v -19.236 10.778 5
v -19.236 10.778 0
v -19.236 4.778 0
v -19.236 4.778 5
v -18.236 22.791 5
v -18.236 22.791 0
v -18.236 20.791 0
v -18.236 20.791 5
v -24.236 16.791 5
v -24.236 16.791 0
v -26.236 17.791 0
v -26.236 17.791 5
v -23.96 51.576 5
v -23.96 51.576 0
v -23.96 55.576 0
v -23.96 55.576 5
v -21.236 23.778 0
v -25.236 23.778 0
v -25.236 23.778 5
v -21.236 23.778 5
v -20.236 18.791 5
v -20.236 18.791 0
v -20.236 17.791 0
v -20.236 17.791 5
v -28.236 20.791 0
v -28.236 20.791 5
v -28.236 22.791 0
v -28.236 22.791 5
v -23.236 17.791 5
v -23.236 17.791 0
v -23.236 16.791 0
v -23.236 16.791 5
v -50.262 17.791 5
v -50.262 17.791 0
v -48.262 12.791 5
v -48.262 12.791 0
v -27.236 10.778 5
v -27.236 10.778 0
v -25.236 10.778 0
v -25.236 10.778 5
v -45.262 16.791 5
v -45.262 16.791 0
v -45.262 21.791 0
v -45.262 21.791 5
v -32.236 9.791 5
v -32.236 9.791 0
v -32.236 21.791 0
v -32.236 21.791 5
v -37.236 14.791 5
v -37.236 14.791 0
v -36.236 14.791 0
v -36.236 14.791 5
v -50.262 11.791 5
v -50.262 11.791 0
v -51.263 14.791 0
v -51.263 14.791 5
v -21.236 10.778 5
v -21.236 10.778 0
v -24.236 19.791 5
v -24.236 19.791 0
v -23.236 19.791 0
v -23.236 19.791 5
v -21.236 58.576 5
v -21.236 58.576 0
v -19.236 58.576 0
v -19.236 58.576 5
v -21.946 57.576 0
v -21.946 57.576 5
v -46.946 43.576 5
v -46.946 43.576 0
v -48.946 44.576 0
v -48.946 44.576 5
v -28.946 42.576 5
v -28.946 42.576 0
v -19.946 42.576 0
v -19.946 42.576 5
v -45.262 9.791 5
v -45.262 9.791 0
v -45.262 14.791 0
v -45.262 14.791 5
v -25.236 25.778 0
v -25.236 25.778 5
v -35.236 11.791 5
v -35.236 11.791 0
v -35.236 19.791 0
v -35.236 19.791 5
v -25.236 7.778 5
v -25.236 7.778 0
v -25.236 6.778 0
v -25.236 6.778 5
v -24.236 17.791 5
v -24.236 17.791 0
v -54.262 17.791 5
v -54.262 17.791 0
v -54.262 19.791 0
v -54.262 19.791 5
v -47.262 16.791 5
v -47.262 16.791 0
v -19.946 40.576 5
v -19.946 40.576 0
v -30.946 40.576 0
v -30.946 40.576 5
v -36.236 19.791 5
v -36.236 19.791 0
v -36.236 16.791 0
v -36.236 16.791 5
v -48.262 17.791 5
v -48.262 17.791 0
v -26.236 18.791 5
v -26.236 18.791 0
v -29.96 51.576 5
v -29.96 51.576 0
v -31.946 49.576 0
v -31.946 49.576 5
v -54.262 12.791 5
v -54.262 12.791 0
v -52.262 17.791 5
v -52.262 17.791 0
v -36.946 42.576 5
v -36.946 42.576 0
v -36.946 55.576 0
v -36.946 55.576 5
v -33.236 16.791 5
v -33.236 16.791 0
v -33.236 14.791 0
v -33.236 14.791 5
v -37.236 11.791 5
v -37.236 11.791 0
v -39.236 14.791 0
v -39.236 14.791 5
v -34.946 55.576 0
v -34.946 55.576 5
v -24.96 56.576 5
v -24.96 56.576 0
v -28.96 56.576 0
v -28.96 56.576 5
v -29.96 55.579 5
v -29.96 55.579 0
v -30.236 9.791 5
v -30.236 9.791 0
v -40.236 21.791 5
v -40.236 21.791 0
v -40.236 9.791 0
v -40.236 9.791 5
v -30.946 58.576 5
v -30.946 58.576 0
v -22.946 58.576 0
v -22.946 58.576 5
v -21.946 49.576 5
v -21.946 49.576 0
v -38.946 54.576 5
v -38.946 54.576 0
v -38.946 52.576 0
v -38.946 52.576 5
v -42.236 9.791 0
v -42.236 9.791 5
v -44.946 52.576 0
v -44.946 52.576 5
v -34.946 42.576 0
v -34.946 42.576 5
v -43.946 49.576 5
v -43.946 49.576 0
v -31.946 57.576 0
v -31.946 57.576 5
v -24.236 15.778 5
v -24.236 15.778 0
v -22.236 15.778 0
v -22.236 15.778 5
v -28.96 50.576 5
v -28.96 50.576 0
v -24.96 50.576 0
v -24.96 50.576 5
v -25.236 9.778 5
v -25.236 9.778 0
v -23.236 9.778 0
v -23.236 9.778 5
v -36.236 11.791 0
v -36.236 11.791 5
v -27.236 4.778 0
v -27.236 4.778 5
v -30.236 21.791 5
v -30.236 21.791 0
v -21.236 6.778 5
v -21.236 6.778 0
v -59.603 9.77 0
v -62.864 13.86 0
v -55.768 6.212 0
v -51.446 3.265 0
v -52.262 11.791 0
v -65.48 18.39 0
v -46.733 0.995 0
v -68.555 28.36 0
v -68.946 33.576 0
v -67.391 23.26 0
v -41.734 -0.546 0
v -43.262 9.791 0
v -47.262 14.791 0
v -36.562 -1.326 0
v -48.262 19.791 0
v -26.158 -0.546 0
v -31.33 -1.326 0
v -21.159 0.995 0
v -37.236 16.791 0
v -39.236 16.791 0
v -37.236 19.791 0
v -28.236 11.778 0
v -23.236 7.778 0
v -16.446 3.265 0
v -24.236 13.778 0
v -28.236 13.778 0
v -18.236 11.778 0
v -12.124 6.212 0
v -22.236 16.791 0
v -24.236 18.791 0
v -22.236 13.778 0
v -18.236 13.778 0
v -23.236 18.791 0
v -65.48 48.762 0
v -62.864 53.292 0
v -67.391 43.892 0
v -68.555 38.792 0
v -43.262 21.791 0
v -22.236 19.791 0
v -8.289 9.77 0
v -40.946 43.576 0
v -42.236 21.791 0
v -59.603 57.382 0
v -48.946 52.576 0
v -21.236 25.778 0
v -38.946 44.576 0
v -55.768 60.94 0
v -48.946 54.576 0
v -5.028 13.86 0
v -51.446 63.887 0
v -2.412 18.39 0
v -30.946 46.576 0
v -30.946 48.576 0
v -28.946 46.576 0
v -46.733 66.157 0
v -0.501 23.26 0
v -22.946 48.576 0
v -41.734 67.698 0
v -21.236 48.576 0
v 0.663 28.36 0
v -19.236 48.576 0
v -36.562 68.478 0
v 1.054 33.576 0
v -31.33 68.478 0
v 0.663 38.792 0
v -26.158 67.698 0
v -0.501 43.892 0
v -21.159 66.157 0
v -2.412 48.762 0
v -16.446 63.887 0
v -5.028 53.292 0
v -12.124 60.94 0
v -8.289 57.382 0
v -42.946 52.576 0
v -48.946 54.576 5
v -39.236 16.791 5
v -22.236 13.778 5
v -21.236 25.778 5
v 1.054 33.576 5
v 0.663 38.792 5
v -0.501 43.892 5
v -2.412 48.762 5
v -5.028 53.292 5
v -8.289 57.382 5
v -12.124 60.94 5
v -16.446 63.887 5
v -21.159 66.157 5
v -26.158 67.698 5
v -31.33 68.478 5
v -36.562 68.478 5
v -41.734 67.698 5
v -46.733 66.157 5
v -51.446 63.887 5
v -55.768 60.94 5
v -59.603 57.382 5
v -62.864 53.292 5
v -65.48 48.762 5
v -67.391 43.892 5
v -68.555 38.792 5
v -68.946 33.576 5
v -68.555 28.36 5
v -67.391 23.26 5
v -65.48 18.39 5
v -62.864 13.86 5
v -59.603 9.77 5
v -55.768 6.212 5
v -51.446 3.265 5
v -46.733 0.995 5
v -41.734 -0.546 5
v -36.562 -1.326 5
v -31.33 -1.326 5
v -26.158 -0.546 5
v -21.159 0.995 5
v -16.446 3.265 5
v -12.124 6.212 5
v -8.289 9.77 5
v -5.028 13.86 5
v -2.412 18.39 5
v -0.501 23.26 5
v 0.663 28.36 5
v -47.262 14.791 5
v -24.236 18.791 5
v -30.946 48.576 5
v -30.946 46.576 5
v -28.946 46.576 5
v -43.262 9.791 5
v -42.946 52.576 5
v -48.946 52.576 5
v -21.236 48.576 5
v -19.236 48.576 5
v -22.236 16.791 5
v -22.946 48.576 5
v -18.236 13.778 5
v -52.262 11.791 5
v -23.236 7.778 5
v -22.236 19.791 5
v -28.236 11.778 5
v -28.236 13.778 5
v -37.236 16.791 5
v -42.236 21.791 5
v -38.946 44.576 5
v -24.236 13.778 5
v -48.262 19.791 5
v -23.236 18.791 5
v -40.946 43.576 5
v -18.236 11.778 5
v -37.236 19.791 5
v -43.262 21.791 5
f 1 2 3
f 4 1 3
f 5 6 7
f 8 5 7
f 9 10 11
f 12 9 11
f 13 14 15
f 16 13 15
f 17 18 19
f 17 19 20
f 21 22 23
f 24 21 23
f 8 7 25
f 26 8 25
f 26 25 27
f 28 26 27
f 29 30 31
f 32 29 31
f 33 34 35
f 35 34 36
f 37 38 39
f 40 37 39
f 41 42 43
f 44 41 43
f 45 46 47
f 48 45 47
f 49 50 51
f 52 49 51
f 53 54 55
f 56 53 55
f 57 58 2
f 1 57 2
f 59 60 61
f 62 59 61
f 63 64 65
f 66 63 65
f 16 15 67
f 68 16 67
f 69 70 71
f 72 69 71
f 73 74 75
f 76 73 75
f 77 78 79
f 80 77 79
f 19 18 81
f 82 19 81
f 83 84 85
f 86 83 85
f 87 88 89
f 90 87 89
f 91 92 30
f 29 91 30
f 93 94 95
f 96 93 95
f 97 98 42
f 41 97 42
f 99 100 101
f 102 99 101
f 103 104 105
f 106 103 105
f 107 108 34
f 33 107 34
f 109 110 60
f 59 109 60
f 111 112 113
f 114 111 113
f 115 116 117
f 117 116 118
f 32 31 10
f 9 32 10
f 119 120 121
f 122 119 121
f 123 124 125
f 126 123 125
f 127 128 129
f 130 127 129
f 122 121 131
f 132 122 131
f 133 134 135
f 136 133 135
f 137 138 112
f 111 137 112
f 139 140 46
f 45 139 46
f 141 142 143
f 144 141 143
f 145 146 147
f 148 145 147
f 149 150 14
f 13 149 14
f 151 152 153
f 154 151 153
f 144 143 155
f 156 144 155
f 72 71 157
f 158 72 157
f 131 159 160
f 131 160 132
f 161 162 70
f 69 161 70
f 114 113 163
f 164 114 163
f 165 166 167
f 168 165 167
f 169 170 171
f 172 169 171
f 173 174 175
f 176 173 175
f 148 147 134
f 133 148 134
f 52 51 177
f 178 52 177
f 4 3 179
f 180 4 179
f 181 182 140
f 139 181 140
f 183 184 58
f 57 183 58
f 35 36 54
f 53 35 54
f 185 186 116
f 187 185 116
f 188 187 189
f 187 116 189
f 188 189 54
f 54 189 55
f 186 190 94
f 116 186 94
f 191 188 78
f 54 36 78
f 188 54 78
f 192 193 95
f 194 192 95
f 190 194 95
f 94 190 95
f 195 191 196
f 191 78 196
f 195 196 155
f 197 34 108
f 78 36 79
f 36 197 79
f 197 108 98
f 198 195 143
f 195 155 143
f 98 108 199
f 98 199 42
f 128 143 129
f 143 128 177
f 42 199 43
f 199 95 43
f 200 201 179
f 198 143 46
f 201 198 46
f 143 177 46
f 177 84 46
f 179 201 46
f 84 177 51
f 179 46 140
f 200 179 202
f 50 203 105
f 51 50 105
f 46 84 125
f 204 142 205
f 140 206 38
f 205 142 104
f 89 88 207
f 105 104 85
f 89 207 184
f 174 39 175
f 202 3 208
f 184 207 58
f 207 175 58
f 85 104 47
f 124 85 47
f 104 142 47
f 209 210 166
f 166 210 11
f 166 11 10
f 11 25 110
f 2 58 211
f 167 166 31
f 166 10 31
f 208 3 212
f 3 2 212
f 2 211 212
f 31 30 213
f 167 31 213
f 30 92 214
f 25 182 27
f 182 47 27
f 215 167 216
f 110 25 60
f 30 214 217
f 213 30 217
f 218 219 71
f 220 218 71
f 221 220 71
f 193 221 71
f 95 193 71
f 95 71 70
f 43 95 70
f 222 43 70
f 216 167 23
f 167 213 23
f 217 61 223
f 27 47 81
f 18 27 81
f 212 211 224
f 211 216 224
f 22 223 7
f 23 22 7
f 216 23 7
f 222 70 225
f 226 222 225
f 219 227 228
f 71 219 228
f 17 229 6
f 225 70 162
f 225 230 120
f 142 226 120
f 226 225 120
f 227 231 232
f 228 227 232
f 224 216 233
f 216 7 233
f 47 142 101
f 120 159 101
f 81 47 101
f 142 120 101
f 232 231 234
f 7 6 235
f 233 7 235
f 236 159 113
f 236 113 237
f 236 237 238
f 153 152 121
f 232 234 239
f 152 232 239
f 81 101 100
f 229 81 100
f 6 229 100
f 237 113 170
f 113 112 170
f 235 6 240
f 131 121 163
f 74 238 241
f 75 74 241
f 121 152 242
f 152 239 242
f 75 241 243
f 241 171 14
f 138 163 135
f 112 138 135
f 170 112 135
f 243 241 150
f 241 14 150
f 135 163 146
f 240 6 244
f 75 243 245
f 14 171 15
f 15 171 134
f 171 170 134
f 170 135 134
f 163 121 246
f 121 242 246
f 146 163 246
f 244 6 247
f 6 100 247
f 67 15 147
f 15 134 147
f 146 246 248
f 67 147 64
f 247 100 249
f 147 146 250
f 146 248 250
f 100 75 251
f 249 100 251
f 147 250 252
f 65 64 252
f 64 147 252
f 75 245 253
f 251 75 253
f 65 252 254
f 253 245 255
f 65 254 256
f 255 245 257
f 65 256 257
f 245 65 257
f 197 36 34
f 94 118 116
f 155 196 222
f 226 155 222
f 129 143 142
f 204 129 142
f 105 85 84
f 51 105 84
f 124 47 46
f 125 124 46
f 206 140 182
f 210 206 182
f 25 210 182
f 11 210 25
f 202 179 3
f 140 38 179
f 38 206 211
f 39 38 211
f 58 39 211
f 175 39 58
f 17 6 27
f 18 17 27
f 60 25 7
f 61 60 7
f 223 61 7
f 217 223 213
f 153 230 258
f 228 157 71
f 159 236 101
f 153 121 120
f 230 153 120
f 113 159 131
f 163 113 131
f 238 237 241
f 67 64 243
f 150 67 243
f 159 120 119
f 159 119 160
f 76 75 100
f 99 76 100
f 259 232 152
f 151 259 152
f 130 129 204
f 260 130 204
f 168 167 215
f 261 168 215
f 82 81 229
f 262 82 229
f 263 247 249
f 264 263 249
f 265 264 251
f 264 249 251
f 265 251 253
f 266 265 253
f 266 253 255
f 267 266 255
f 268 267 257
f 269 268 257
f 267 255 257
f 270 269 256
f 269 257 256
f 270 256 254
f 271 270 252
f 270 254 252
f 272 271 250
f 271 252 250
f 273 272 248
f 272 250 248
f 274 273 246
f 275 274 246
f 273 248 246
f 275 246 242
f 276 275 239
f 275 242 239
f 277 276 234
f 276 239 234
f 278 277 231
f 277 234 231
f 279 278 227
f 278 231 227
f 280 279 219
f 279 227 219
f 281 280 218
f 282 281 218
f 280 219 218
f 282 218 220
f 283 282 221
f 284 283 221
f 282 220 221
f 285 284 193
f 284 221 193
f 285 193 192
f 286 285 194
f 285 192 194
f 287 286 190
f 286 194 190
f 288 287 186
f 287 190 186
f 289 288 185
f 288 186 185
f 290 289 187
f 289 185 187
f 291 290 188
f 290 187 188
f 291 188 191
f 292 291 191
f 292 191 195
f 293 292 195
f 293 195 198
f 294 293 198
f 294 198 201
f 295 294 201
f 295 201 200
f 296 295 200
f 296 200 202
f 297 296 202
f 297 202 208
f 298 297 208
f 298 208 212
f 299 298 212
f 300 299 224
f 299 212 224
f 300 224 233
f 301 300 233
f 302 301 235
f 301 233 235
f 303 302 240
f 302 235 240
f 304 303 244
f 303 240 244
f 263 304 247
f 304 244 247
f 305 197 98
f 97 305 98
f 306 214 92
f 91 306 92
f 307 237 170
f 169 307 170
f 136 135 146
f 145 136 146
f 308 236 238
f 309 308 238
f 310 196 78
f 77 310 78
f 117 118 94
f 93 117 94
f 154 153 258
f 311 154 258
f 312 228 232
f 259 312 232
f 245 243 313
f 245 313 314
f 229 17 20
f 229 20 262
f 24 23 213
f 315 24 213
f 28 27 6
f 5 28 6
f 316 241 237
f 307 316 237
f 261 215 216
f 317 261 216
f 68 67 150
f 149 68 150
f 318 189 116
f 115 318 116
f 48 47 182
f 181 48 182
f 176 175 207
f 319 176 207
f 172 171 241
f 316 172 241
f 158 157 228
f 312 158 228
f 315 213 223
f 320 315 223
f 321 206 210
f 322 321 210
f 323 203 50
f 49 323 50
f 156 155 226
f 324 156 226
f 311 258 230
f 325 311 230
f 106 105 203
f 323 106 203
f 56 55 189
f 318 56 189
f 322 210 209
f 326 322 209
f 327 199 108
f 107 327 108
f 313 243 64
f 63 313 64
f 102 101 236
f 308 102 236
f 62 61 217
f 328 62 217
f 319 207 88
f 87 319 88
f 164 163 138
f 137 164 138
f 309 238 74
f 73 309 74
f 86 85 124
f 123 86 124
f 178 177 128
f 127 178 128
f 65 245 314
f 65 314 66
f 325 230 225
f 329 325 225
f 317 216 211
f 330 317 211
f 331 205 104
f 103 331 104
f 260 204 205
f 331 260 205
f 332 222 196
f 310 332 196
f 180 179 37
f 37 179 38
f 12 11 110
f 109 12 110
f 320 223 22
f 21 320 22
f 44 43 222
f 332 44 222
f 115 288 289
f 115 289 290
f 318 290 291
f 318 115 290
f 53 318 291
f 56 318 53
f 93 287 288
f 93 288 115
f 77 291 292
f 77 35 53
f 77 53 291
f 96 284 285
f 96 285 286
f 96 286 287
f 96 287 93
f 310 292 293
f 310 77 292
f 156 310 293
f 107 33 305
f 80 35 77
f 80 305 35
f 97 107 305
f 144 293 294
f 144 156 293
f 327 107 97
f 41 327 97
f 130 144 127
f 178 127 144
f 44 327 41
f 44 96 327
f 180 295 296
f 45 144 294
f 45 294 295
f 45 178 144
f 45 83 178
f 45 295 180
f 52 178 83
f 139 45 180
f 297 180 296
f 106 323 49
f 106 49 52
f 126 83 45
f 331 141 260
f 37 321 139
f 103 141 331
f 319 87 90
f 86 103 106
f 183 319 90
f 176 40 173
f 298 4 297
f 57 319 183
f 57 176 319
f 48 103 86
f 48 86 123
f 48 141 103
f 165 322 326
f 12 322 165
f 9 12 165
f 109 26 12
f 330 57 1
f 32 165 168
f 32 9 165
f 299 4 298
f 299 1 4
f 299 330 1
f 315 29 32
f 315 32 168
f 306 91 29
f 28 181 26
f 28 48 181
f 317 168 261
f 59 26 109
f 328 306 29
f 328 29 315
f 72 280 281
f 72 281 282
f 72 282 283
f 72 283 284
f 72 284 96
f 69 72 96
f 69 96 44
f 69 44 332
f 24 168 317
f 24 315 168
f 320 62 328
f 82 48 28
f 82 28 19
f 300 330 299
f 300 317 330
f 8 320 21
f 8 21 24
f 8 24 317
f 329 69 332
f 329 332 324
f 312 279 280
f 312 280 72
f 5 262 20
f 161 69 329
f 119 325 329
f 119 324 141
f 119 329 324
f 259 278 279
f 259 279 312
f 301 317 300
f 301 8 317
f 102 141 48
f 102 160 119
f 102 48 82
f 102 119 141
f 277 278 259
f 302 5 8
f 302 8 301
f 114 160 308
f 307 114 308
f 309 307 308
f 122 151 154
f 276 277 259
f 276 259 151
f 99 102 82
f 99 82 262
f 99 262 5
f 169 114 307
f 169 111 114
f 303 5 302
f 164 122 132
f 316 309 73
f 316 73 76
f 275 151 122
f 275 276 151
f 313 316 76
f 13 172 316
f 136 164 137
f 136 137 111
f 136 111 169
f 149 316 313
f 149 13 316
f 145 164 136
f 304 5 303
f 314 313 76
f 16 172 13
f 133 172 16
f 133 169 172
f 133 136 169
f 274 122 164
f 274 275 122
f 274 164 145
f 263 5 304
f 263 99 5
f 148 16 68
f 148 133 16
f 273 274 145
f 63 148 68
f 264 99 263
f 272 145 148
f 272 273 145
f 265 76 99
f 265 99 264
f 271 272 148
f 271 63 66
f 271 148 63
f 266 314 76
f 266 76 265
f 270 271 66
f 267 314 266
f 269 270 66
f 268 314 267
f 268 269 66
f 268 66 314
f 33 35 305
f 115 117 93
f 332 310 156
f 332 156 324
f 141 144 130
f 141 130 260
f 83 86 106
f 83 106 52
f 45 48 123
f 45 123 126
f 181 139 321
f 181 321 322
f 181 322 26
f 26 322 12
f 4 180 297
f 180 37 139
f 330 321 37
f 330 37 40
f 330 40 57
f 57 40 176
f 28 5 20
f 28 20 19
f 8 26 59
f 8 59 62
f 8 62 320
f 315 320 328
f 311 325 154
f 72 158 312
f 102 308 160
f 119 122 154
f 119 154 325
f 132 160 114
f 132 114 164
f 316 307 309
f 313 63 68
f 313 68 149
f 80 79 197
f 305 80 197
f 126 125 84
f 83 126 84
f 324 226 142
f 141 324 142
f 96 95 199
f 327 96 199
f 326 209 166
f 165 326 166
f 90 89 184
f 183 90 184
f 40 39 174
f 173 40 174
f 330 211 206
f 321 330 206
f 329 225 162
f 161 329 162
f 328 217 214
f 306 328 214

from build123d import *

# Parameters (mm, degrees)
F0_R     = 35
F0_W     = 4
F0_H     = 2
F0_W_2   = 2
F0_H_2   = 13
F0_H_3   = 10
F1_DEPTH = 5


with BuildPart() as f1:
    # F0 (on Top) → F1 (new body)
    with BuildSketch(Plane.XY):
        with Locations((-33.946003, 33.575995)):
            Circle(F0_R)
        Polygon((-54.261632, 19.790954), (-48.261632, 19.790954), (-48.261632, 17.790954), (-50.261632, 17.790954), (-48.261632, 12.791132), (-50.261632, 11.791284), (-51.262511, 14.790954), (-52.261632, 11.790954), (-54.261632, 12.791132), (-52.261632, 17.790954), (-54.261632, 17.790954), align=None, mode=Mode.SUBTRACT)
        Polygon((-45.261632, 21.791132), (-43.261632, 21.791132), (-43.261632, 9.791132), (-45.261632, 9.791132), (-45.261632, 14.791132), (-47.261632, 14.791132), (-47.261632, 16.791132), (-45.261632, 16.791132), align=None, mode=Mode.SUBTRACT)
        Polygon((-41.261632, 21.791132), (-40.235692, 21.791132), (-40.235692, 9.791132), (-42.235692, 9.791132), (-42.235692, 21.791132), align=None, mode=Mode.SUBTRACT)
        Polygon((-39.235692, 14.791132), (-39.235692, 16.791132), (-37.235692, 19.791132), (-36.235692, 19.791132), (-36.235692, 16.791132), (-37.235692, 16.791132), (-37.235692, 14.791132), (-36.235692, 14.791132), (-36.235692, 11.791132), (-37.235692, 11.791132), align=None, mode=Mode.SUBTRACT)
        Polygon((-35.235692, 11.791132), (-35.235692, 19.791132), (-33.235692, 16.791132), (-33.235692, 14.791132), align=None, mode=Mode.SUBTRACT)
        Polygon((-32.235692, 21.791132), (-30.235692, 21.791132), (-30.235692, 9.791132), (-32.235692, 9.791132), (-32.235692, 11.791132), (-32.235692, 19.791132), align=None, mode=Mode.SUBTRACT)
        Polygon((-27.235692, 4.777636), (-27.235692, 10.777636), (-26.235692, 10.777636), (-25.235692, 10.777636), (-25.235692, 9.777636), (-23.235692, 9.777636), (-23.235692, 7.777636), (-25.235692, 7.777636), (-25.235692, 6.777636), (-21.235692, 6.777636), (-21.235692, 10.777636), (-20.235692, 10.777636), (-19.235692, 10.777636), (-19.235692, 4.777636), align=None, mode=Mode.SUBTRACT)
        Polygon((-18.235692, 11.777636), (-28.235692, 11.777636), (-28.235692, 13.777636), (-24.235692, 13.777636), (-24.235692, 15.777636), (-22.235692, 15.777636), (-22.235692, 13.777636), (-18.235692, 13.777636), align=None, mode=Mode.SUBTRACT)
        Polygon((-23.235692, 16.791132), (-24.235692, 16.791132), (-26.235692, 17.79098), (-26.235692, 18.791284), (-24.235692, 19.791132), (-23.235692, 19.791132), (-23.235692, 18.791132), (-24.235692, 18.791132), (-24.235692, 17.79098), (-23.235692, 17.79098), align=None, mode=Mode.SUBTRACT)
        Polygon((-22.235692, 19.791132), (-20.235692, 18.79098), (-20.235692, 17.79098), (-22.235692, 16.791132), align=None, mode=Mode.SUBTRACT)
        Polygon((-28.235692, 22.791132), (-18.235692, 22.791132), (-18.235692, 20.791132), (-28.235692, 20.791132), (-28.235692, 21.791132), align=None, mode=Mode.SUBTRACT)
        with Locations((-23.235692, 24.777636)):
            Rectangle(F0_W, F0_H, mode=Mode.SUBTRACT)
        Polygon((-48.946003, 52.576141), (-48.946003, 54.576141), (-38.946003, 54.576141), (-38.946003, 52.576141), (-42.945711, 52.576141), (-38.946003, 44.575995), (-40.946039, 43.576068), (-43.946094, 49.575812), (-46.946003, 43.575995), (-48.945828, 44.575907), (-44.945711, 52.576141), align=None, mode=Mode.SUBTRACT)
        with Locations((-35.946003, 49.075995)):
            Rectangle(F0_W_2, F0_H_2, mode=Mode.SUBTRACT)
        Polygon((-30.946003, 40.575995), (-30.946003, 46.575995), (-28.946003, 46.575995), (-28.946003, 42.575995), (-19.946003, 42.575995), (-19.946003, 40.575995), (-28.946003, 40.575995), align=None, mode=Mode.SUBTRACT)
        Polygon((-22.946003, 48.575995), (-30.946003, 48.575995), (-28.959546, 50.575995), (-24.959546, 50.575995), align=None, mode=Mode.SUBTRACT)
        Polygon((-31.946003, 49.575995), (-31.946003, 57.575995), (-29.959546, 55.579393), (-29.959546, 51.575995), align=None, mode=Mode.SUBTRACT)
        Polygon((-28.959546, 56.575995), (-30.946003, 58.575995), (-22.946003, 58.575995), (-24.959546, 56.575995), align=None, mode=Mode.SUBTRACT)
        Polygon((-23.959546, 55.575995), (-21.946003, 57.575995), (-21.946003, 49.575995), (-23.959546, 51.575995), align=None, mode=Mode.SUBTRACT)
        with Locations((-20.235692, 53.575995)):
            Rectangle(F0_W_2, F0_H_3, mode=Mode.SUBTRACT)
    extrude(amount=F1_DEPTH)


solid = f1.part
